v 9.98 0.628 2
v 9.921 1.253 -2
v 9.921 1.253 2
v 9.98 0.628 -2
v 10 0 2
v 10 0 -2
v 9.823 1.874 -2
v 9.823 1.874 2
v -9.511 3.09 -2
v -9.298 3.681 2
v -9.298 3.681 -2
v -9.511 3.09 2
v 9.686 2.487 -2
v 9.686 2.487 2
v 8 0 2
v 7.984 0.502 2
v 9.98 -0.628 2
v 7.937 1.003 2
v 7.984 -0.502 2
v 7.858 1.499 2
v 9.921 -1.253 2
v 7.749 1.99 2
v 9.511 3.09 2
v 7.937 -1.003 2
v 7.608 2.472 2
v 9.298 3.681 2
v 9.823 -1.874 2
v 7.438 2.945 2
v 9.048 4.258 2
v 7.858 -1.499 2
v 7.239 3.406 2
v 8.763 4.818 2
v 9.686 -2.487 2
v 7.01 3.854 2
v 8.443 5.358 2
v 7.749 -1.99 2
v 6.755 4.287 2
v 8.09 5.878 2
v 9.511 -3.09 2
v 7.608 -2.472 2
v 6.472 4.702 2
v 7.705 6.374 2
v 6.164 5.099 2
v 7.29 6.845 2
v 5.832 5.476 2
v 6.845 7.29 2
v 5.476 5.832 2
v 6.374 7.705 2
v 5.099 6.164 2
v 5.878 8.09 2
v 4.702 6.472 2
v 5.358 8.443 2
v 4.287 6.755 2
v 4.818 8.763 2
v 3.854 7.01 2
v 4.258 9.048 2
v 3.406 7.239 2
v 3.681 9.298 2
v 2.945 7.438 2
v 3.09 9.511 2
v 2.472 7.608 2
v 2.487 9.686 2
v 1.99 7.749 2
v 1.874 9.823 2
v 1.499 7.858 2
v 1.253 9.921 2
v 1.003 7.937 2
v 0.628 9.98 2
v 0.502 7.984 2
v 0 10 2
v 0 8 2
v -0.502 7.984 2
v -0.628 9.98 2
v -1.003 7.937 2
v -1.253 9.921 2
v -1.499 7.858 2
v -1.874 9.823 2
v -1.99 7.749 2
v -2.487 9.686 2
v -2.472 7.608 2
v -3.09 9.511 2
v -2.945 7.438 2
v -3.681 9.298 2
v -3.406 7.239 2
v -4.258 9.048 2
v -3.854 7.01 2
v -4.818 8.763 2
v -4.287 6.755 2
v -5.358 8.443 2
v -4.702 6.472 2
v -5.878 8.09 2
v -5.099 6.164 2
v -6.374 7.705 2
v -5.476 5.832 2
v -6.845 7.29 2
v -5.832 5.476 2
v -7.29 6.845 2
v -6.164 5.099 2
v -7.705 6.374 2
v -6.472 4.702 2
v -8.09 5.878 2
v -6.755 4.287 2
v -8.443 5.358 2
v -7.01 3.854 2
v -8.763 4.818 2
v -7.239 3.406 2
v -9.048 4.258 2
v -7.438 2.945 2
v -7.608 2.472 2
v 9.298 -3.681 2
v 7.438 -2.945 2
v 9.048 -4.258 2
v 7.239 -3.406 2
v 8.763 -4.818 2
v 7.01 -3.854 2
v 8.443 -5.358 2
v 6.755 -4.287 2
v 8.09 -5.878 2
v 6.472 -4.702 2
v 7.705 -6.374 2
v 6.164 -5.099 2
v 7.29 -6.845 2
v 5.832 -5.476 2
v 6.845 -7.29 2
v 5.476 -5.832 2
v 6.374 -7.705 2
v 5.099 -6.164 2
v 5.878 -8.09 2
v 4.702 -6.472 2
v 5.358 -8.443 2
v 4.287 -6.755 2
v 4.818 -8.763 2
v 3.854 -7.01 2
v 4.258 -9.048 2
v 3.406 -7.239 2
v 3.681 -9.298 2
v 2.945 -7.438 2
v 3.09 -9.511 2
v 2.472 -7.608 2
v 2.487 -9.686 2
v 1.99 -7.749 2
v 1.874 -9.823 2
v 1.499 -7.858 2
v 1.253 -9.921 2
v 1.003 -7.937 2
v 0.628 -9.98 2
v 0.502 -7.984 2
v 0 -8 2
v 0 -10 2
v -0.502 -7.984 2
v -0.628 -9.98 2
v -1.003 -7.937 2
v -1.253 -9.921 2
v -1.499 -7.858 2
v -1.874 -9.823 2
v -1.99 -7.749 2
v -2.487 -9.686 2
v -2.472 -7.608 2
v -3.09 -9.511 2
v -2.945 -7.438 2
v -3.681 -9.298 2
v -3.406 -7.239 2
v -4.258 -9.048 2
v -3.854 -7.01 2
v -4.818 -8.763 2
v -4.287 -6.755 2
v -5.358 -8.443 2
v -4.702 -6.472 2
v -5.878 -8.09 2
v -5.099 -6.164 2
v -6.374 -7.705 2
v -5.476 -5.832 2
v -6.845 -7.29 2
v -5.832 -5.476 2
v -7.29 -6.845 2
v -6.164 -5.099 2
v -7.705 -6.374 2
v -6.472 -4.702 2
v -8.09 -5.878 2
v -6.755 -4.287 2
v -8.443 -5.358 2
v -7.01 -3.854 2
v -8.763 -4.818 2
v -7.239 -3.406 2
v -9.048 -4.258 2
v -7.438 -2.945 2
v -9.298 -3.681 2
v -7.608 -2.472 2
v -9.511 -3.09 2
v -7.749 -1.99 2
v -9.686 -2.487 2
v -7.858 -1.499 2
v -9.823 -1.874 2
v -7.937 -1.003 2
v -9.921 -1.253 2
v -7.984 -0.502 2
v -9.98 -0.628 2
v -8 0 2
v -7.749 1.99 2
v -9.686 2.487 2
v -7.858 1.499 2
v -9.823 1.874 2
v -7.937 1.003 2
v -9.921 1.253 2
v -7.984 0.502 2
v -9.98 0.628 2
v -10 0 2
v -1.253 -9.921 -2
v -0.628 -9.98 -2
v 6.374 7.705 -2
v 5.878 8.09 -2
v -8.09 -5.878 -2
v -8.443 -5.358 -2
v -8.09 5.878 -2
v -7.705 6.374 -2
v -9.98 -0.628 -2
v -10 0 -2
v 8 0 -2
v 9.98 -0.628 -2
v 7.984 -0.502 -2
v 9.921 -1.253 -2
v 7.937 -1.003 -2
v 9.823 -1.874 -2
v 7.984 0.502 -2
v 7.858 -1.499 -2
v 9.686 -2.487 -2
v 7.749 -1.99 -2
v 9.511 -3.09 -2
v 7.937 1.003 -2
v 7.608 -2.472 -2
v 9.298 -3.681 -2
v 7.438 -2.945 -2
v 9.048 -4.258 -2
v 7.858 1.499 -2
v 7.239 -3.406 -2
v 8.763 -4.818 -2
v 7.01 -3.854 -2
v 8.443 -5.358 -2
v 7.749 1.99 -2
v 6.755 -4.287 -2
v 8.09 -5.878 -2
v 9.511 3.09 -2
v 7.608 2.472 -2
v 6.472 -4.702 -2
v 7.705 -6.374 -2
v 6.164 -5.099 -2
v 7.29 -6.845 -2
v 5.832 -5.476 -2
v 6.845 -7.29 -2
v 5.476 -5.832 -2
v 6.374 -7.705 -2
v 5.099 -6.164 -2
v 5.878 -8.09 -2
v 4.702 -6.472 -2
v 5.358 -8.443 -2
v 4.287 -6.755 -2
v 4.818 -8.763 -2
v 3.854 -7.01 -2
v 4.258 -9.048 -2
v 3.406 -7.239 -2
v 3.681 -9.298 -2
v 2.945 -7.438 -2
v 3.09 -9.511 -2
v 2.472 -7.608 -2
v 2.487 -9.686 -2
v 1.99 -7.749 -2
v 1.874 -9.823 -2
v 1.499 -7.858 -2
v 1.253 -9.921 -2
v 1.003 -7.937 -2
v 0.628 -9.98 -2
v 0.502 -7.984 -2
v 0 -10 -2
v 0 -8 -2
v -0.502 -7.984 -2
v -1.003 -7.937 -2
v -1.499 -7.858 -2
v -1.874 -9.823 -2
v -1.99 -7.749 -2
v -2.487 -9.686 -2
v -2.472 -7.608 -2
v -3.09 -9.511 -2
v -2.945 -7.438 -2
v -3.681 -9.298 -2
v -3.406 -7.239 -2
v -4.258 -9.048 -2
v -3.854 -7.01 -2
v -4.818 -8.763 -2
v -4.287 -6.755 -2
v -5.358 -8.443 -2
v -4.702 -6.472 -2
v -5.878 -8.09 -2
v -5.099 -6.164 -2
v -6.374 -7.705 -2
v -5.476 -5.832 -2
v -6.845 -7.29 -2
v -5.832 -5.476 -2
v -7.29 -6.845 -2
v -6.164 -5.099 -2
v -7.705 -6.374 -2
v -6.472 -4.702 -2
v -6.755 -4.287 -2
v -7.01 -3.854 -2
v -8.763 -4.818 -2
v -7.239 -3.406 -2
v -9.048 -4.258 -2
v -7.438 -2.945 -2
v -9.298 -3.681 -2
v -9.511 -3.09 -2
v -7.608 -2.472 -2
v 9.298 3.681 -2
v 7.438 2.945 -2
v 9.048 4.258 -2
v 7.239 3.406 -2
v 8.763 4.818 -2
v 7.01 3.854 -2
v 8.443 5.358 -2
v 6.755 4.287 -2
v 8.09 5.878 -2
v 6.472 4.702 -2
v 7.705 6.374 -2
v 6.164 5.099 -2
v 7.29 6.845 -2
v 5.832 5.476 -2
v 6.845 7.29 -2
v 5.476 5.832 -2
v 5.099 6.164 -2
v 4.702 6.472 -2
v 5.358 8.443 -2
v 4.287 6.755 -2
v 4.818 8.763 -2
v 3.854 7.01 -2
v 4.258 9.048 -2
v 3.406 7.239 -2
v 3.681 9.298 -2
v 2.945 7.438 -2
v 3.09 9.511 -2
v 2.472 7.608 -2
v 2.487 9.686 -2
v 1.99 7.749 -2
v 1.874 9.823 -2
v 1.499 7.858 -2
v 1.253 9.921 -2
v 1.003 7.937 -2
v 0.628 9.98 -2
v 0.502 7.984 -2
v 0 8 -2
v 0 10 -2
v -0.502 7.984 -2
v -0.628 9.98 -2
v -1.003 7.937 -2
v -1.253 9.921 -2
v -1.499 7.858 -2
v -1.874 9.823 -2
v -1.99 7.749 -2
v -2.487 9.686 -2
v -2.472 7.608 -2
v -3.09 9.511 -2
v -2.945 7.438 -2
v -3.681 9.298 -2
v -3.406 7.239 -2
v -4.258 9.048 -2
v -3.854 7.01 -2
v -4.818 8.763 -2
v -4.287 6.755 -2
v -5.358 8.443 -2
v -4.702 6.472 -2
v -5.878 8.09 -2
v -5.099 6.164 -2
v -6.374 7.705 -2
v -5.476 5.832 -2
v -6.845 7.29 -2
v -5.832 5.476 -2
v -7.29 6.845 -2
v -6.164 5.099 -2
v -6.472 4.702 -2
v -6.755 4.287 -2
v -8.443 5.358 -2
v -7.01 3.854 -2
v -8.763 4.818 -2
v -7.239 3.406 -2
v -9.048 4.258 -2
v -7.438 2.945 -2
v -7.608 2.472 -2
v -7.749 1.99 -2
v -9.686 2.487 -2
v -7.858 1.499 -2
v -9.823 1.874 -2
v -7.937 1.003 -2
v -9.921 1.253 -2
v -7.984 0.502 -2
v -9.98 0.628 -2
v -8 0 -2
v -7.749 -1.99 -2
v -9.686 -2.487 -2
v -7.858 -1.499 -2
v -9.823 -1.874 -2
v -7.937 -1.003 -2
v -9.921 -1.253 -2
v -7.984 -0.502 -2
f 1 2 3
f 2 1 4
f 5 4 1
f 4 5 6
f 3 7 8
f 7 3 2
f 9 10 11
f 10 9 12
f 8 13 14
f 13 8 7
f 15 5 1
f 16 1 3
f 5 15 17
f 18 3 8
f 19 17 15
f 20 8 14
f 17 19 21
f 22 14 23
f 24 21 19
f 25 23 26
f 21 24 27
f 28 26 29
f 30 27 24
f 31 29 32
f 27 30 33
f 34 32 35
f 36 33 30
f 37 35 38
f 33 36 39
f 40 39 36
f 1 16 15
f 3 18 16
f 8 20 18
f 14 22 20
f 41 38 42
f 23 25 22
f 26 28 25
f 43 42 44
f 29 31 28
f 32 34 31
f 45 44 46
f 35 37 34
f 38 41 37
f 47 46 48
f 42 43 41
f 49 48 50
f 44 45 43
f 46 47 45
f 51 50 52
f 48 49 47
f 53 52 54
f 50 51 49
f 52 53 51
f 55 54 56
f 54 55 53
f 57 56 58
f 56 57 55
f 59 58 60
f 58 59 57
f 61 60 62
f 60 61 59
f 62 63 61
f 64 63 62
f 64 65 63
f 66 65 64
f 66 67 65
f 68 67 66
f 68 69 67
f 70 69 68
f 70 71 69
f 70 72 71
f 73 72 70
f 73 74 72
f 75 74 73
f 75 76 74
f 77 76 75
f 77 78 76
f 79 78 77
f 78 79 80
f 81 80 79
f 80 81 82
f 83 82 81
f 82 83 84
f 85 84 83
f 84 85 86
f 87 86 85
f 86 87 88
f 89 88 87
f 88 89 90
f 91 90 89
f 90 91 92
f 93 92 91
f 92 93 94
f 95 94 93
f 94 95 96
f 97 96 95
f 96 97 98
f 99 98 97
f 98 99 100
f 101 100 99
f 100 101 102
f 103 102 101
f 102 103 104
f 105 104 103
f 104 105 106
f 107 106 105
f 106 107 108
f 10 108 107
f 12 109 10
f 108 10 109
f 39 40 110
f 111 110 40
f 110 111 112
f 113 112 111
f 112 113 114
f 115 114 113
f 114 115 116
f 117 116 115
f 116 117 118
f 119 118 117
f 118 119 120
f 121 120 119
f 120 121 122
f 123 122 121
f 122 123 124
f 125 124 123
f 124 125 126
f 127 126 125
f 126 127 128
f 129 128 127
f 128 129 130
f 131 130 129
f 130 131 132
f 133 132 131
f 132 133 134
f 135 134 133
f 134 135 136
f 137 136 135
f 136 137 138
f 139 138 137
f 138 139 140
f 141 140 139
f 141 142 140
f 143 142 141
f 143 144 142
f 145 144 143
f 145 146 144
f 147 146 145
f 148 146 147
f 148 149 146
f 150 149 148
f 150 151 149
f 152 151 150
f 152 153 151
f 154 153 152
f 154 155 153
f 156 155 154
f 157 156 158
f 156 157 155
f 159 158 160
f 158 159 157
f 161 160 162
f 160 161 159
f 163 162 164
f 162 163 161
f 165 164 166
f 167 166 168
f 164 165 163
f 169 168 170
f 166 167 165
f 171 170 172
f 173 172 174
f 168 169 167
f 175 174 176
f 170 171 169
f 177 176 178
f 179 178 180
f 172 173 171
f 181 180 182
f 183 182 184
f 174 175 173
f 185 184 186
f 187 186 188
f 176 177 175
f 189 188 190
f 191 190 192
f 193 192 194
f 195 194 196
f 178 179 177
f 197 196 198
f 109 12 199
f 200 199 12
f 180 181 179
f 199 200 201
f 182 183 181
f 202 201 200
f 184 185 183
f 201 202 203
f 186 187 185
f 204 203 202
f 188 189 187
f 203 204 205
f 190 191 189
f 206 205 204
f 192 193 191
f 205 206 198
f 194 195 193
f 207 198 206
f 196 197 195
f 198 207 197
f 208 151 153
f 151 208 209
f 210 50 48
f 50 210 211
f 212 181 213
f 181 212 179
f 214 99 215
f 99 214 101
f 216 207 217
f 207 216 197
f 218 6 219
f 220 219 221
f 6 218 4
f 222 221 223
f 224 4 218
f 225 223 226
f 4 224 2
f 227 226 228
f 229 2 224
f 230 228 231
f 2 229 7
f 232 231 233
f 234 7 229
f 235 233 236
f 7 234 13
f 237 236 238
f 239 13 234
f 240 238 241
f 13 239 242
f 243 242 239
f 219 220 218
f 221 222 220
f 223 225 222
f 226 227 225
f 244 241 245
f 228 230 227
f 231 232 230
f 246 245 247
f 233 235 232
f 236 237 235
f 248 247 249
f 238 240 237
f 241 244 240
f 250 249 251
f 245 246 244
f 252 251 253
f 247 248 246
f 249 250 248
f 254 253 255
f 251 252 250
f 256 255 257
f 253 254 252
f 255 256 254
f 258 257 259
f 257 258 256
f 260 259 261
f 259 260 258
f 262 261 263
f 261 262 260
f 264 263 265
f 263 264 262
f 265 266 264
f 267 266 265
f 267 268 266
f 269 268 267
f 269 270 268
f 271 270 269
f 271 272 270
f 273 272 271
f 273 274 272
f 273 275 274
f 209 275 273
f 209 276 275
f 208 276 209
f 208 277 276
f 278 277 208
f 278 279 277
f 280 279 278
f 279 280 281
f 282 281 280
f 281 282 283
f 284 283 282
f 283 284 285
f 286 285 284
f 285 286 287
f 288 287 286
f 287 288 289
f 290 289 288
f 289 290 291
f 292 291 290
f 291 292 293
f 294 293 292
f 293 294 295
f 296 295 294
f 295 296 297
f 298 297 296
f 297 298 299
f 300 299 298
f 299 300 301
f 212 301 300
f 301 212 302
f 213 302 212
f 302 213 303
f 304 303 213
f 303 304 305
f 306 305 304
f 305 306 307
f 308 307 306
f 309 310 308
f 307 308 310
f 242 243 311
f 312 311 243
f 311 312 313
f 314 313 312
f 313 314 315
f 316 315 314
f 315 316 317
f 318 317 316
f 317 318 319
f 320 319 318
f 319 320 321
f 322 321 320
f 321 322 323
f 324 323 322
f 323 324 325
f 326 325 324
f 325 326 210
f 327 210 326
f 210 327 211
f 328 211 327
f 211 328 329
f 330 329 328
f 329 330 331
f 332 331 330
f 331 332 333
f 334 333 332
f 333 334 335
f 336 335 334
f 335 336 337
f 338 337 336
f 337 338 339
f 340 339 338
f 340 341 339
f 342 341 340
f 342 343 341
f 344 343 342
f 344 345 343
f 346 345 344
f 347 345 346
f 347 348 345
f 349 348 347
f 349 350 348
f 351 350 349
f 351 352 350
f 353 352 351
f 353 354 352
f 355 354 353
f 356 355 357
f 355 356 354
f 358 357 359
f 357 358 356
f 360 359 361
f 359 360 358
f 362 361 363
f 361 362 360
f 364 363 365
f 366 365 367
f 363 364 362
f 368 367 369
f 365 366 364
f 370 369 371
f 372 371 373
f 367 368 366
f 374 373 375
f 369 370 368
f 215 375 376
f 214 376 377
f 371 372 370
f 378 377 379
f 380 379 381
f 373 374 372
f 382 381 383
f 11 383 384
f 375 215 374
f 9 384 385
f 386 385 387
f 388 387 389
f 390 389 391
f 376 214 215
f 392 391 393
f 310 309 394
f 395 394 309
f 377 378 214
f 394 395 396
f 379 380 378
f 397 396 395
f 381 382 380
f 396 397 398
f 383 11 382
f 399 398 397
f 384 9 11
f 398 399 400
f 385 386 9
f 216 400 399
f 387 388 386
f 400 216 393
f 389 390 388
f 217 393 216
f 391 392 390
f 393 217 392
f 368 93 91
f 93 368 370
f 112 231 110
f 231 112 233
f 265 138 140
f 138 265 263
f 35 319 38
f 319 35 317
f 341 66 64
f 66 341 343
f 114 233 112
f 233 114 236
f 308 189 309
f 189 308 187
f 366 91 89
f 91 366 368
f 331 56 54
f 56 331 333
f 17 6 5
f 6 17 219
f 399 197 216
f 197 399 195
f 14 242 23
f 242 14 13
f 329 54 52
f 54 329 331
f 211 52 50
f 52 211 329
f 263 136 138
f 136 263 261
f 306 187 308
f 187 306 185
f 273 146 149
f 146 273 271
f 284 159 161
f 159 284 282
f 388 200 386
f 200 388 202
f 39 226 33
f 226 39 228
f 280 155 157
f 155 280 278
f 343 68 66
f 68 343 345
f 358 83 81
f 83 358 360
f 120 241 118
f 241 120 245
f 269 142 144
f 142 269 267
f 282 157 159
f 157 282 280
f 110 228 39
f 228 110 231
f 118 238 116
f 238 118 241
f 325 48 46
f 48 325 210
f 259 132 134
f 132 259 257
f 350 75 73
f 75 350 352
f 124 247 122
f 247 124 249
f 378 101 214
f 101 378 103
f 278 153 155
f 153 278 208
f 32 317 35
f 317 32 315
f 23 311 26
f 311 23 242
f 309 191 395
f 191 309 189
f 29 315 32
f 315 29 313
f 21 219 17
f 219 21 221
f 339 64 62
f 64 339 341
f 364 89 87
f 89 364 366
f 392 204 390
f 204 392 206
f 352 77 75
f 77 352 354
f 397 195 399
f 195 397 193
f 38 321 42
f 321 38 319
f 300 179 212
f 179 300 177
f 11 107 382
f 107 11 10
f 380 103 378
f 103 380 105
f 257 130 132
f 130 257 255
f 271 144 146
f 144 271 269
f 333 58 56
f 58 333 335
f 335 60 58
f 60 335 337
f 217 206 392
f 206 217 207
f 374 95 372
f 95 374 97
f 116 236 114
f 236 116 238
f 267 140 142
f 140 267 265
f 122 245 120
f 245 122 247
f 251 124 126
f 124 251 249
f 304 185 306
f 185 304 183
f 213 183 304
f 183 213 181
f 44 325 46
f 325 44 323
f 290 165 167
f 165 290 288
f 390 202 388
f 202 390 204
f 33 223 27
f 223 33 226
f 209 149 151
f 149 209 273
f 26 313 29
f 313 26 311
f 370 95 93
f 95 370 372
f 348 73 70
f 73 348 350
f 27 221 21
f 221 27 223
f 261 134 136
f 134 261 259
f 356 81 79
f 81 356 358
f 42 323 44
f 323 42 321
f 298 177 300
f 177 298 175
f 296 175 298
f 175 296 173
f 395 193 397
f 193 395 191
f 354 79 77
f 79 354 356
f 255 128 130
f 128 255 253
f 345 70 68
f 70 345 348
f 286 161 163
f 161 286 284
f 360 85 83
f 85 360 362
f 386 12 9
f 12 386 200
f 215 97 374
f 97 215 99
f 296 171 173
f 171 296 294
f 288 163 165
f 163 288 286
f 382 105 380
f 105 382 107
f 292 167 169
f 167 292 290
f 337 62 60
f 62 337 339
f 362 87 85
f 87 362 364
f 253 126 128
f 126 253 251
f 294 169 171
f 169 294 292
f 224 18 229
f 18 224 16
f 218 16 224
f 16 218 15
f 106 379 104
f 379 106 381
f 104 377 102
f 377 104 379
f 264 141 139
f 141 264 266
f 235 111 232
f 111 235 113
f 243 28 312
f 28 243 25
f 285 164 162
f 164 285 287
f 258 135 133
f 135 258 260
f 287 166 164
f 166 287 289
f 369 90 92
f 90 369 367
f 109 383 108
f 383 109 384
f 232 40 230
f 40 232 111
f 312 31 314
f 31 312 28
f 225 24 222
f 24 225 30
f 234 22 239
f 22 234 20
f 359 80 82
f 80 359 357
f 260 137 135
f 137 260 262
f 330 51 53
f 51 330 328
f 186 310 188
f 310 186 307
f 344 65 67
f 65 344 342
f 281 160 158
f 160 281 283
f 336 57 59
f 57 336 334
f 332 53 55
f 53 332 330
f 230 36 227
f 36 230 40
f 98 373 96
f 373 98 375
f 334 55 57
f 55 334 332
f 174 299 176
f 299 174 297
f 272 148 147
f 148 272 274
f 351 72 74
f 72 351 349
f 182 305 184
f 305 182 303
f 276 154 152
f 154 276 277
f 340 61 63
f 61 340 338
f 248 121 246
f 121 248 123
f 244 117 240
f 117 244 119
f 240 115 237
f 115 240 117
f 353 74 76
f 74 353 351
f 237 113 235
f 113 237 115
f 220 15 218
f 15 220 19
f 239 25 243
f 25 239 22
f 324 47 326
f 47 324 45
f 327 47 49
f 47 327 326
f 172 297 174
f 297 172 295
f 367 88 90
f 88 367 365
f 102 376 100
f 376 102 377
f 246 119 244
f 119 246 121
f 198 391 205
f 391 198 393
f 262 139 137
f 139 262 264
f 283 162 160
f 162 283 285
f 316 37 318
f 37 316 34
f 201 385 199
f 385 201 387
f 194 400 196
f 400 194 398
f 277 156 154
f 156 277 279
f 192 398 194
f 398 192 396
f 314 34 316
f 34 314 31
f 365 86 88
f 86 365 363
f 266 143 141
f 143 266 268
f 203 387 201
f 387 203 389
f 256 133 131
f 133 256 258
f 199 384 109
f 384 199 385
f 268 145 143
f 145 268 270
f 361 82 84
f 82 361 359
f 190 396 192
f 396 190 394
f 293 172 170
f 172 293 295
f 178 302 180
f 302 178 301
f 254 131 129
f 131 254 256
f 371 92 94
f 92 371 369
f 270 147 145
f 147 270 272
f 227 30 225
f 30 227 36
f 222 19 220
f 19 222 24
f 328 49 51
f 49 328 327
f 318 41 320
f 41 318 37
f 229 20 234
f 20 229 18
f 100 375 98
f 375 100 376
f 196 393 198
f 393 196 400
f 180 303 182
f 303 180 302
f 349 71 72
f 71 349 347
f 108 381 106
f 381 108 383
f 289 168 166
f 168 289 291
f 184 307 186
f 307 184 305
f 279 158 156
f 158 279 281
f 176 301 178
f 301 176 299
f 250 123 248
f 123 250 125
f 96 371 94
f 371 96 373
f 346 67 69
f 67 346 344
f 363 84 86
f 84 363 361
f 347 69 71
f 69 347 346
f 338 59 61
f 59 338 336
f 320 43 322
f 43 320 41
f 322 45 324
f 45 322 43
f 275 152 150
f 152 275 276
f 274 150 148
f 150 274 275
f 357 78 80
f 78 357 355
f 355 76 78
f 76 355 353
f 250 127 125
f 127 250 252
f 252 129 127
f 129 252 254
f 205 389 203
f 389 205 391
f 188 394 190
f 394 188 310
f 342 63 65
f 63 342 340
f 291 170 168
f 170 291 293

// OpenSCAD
difference()
{
	cylinder (h = 4, r=10, center = true, $fn=100);

	cylinder (h = 4.20, r=8, center = true, $fn=100);
}
